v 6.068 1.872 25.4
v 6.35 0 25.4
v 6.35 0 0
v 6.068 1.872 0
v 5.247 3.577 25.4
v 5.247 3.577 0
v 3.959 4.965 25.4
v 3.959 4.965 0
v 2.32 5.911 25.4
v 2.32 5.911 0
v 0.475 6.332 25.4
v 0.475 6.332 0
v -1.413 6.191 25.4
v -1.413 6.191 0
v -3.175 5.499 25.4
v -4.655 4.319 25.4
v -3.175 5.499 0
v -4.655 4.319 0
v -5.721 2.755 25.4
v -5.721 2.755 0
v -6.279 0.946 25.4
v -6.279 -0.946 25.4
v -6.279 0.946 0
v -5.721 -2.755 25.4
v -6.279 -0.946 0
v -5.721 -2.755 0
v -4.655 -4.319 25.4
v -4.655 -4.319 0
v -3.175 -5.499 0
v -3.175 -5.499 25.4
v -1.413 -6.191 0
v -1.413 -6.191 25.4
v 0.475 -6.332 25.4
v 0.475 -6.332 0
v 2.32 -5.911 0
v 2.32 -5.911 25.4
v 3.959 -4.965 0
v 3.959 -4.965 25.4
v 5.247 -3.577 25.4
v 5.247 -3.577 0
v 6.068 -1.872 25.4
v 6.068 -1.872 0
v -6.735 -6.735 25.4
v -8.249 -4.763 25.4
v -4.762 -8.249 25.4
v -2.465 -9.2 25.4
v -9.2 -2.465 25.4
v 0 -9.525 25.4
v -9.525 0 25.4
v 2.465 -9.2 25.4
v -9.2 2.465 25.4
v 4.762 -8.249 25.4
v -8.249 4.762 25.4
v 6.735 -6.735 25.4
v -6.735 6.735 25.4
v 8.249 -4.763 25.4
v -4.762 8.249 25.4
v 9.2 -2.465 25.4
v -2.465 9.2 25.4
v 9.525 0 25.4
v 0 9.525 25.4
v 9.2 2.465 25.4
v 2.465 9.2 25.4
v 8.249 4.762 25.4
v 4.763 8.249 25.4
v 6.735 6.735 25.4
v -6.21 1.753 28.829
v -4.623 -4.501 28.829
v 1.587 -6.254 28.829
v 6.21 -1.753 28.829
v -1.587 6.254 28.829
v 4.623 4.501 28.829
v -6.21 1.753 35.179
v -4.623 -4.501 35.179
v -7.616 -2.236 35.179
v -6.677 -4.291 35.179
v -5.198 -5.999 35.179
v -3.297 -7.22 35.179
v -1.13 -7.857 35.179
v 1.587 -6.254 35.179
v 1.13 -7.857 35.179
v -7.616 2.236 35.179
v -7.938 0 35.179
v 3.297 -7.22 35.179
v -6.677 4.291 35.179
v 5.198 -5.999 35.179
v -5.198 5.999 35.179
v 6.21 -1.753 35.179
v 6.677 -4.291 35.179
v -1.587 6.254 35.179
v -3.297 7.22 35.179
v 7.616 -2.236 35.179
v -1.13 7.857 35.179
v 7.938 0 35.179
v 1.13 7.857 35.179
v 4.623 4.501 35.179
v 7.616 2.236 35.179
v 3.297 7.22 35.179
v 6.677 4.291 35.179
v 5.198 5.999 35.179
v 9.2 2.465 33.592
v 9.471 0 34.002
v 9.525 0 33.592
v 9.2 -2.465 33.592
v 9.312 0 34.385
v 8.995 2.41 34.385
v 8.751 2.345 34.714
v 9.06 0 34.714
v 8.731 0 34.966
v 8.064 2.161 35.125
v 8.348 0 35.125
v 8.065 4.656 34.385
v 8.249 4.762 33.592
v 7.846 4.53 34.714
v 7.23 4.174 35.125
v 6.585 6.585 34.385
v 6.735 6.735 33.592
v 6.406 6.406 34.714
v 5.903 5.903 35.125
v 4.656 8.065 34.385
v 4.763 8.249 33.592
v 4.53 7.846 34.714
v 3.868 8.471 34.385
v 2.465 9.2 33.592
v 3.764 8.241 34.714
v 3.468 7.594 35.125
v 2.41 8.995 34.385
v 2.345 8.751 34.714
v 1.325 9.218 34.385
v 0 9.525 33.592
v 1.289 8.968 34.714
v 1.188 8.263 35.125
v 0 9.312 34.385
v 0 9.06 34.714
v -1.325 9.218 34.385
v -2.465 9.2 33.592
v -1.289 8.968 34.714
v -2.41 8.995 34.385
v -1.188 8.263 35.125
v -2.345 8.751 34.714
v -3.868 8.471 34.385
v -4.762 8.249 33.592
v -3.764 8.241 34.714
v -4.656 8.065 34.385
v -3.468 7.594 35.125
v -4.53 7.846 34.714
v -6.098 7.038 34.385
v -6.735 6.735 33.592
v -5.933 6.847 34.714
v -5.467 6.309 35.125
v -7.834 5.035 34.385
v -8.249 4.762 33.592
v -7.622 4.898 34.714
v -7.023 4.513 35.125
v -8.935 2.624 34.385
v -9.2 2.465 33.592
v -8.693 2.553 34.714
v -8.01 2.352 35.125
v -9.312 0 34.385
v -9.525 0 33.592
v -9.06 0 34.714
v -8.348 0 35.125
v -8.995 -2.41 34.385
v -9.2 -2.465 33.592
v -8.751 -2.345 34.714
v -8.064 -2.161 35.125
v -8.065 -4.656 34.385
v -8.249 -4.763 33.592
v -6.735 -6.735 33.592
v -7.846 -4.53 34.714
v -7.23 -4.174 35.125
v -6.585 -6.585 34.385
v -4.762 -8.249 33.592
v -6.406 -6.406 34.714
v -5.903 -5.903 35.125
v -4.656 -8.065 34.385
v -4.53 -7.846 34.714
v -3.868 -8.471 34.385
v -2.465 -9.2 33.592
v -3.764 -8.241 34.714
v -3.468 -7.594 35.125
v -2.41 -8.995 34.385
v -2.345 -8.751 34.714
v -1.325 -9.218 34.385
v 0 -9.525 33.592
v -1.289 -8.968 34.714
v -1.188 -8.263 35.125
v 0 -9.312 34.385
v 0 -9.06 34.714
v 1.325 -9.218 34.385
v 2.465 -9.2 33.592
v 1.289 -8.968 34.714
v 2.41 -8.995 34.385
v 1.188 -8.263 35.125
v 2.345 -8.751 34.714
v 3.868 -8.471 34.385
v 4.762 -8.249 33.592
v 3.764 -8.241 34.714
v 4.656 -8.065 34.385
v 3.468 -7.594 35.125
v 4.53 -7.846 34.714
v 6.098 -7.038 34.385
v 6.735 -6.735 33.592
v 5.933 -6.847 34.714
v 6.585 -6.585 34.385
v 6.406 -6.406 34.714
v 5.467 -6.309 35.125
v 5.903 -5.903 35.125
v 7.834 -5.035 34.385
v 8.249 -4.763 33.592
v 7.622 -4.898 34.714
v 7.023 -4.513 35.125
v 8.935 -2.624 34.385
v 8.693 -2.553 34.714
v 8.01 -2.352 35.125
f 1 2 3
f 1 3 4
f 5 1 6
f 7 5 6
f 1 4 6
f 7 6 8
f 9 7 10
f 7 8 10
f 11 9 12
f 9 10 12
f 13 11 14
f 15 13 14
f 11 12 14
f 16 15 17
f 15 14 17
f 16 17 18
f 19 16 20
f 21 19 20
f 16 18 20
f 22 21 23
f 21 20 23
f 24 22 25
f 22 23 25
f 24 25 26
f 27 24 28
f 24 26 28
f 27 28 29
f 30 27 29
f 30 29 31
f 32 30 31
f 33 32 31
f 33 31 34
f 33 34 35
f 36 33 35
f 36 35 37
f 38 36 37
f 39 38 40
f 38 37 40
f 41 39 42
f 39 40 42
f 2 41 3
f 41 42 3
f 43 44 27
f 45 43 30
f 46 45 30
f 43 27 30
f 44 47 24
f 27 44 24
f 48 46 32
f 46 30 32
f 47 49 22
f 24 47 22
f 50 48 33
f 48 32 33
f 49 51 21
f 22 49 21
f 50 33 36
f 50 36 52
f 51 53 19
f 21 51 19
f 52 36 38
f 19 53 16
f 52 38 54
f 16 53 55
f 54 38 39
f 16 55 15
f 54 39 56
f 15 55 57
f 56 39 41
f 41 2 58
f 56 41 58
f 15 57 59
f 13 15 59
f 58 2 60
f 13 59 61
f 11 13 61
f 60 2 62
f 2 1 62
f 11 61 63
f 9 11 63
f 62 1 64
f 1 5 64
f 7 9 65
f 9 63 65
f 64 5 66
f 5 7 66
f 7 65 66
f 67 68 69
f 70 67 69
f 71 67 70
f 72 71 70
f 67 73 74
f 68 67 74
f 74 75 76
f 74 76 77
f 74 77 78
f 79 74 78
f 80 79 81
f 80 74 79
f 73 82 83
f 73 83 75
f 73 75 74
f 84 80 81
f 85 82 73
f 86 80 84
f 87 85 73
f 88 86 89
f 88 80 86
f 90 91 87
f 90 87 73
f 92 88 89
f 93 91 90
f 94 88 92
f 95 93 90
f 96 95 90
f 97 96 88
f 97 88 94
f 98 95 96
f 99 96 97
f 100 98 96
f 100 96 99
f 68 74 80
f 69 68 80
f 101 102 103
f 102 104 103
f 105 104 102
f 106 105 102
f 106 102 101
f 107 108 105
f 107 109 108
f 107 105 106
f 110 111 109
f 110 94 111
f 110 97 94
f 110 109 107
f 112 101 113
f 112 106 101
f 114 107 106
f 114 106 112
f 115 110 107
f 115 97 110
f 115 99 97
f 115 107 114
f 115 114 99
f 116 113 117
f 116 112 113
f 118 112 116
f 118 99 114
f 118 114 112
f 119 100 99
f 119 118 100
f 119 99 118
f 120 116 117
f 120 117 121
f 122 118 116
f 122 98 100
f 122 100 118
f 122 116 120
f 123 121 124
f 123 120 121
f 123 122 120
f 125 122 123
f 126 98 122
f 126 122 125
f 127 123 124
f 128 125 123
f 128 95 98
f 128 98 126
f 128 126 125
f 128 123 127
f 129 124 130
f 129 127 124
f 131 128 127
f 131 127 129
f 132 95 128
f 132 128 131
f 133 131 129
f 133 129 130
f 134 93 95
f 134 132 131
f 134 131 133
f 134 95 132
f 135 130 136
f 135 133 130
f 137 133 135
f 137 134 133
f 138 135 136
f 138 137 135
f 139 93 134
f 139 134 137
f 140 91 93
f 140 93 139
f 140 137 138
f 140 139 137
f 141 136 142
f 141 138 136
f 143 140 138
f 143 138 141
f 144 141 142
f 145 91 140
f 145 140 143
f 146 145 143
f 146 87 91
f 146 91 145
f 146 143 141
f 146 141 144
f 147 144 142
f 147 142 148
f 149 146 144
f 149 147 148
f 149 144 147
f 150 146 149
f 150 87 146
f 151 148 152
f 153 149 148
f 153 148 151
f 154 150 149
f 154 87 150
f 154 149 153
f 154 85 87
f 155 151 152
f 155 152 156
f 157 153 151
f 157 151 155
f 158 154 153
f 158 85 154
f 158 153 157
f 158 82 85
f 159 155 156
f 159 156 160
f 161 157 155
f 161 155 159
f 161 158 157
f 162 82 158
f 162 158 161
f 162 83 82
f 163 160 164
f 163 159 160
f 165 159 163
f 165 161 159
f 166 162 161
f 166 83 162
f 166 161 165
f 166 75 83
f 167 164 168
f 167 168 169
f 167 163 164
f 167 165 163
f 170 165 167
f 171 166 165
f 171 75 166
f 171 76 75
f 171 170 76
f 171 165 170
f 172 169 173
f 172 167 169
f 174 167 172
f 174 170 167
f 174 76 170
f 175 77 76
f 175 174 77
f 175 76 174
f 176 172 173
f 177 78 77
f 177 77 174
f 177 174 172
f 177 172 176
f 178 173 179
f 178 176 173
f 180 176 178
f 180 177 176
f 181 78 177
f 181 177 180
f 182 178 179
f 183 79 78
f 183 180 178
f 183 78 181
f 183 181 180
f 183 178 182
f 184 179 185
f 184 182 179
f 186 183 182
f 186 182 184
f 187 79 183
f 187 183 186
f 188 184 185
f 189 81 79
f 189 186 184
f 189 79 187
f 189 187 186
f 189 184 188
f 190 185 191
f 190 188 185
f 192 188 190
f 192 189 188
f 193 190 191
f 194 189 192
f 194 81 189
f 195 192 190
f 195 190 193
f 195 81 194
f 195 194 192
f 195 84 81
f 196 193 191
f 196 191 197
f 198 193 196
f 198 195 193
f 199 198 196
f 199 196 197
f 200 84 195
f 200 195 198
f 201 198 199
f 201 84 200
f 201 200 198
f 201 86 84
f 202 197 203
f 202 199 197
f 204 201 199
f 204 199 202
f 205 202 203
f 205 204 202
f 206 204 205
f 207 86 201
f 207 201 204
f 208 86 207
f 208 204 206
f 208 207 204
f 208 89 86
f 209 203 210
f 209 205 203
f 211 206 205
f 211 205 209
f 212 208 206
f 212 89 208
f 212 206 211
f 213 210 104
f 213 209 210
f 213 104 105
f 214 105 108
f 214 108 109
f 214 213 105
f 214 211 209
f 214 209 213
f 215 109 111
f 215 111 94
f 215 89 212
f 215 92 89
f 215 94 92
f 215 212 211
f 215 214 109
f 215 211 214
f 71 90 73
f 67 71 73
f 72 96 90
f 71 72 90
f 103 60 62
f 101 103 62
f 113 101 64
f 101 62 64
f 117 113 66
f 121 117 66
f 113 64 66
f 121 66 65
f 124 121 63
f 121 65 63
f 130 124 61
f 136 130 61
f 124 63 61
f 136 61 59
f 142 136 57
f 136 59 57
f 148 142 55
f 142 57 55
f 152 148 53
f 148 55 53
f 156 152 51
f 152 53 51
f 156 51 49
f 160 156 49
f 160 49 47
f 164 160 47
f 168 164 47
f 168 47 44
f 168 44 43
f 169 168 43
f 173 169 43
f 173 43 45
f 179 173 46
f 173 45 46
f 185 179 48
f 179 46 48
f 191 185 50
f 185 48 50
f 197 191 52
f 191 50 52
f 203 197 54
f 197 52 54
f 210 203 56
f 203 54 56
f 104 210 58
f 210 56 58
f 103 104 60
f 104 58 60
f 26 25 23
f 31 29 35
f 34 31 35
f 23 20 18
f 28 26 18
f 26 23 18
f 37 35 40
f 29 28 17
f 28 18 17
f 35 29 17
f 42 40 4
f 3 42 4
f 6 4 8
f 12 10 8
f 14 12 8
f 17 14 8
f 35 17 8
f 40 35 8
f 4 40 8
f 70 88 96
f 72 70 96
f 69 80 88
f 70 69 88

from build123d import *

# Parameters (mm, degrees)
F0_R      = 6.35
F1_DEPTH  = 25.4
F2_R      = 9.525
F3_DEPTH  = 9.8425
F4_R      = 1.5875
F6_DEPTH  = 6.35
F8_R      = 9.525
F9_DEPTH  = 9.779
F10_R     = 1.5875
F12_DEPTH = 6.35


with BuildPart() as f1:
    # F0 (on Top) → F1 (new body)
    with BuildSketch(Plane.XY):
        Circle(F0_R)
    extrude(amount=F1_DEPTH)

    # F8 (on face) → F9 (join)
    with BuildSketch(Plane.XY.offset(25.4)):
        Circle(F8_R)
    extrude(amount=F9_DEPTH)

    # F10
    f10_edges = [f1.edges().sort_by_distance(p)[0] for p in [
        (-9.525, 0, 35.179),
    ]]
    fillet(f10_edges, radius=F10_R)

    # F11 (on face) → F12 (cut)
    with BuildSketch(Plane.XY.offset(35.179)):
        Polygon((1.58678, -6.254315), (6.209785, -1.752966), (4.623006, 4.501349), (-1.58678, 6.254315), (-6.209785, 1.752966), (-4.623006, -4.501349), align=None)
    extrude(amount=-F12_DEPTH, mode=Mode.SUBTRACT)


with BuildPart() as f3:
    # F2 (on face) → F3 (new body)
    with BuildSketch(Plane.XY.offset(25.4)):
        Circle(F2_R)
    extrude(amount=F3_DEPTH)

    # F4
    f4_edges = [f3.edges().sort_by_distance(p)[0] for p in [
        (-9.525, 0, 35.2425),
    ]]
    fillet(f4_edges, radius=F4_R)

    # F5 (on face) → F6 (cut)
    with BuildSketch(Plane.XY.offset(35.2425)):
        Polygon((6.020851, -2.017882), (4.757963, 4.205269), (-1.262889, 6.223151), (-6.020851, 2.017882), (-4.757963, -4.205269), (1.262889, -6.223151), align=None)
    extrude(amount=-F6_DEPTH, mode=Mode.SUBTRACT)


solid = f1.part
